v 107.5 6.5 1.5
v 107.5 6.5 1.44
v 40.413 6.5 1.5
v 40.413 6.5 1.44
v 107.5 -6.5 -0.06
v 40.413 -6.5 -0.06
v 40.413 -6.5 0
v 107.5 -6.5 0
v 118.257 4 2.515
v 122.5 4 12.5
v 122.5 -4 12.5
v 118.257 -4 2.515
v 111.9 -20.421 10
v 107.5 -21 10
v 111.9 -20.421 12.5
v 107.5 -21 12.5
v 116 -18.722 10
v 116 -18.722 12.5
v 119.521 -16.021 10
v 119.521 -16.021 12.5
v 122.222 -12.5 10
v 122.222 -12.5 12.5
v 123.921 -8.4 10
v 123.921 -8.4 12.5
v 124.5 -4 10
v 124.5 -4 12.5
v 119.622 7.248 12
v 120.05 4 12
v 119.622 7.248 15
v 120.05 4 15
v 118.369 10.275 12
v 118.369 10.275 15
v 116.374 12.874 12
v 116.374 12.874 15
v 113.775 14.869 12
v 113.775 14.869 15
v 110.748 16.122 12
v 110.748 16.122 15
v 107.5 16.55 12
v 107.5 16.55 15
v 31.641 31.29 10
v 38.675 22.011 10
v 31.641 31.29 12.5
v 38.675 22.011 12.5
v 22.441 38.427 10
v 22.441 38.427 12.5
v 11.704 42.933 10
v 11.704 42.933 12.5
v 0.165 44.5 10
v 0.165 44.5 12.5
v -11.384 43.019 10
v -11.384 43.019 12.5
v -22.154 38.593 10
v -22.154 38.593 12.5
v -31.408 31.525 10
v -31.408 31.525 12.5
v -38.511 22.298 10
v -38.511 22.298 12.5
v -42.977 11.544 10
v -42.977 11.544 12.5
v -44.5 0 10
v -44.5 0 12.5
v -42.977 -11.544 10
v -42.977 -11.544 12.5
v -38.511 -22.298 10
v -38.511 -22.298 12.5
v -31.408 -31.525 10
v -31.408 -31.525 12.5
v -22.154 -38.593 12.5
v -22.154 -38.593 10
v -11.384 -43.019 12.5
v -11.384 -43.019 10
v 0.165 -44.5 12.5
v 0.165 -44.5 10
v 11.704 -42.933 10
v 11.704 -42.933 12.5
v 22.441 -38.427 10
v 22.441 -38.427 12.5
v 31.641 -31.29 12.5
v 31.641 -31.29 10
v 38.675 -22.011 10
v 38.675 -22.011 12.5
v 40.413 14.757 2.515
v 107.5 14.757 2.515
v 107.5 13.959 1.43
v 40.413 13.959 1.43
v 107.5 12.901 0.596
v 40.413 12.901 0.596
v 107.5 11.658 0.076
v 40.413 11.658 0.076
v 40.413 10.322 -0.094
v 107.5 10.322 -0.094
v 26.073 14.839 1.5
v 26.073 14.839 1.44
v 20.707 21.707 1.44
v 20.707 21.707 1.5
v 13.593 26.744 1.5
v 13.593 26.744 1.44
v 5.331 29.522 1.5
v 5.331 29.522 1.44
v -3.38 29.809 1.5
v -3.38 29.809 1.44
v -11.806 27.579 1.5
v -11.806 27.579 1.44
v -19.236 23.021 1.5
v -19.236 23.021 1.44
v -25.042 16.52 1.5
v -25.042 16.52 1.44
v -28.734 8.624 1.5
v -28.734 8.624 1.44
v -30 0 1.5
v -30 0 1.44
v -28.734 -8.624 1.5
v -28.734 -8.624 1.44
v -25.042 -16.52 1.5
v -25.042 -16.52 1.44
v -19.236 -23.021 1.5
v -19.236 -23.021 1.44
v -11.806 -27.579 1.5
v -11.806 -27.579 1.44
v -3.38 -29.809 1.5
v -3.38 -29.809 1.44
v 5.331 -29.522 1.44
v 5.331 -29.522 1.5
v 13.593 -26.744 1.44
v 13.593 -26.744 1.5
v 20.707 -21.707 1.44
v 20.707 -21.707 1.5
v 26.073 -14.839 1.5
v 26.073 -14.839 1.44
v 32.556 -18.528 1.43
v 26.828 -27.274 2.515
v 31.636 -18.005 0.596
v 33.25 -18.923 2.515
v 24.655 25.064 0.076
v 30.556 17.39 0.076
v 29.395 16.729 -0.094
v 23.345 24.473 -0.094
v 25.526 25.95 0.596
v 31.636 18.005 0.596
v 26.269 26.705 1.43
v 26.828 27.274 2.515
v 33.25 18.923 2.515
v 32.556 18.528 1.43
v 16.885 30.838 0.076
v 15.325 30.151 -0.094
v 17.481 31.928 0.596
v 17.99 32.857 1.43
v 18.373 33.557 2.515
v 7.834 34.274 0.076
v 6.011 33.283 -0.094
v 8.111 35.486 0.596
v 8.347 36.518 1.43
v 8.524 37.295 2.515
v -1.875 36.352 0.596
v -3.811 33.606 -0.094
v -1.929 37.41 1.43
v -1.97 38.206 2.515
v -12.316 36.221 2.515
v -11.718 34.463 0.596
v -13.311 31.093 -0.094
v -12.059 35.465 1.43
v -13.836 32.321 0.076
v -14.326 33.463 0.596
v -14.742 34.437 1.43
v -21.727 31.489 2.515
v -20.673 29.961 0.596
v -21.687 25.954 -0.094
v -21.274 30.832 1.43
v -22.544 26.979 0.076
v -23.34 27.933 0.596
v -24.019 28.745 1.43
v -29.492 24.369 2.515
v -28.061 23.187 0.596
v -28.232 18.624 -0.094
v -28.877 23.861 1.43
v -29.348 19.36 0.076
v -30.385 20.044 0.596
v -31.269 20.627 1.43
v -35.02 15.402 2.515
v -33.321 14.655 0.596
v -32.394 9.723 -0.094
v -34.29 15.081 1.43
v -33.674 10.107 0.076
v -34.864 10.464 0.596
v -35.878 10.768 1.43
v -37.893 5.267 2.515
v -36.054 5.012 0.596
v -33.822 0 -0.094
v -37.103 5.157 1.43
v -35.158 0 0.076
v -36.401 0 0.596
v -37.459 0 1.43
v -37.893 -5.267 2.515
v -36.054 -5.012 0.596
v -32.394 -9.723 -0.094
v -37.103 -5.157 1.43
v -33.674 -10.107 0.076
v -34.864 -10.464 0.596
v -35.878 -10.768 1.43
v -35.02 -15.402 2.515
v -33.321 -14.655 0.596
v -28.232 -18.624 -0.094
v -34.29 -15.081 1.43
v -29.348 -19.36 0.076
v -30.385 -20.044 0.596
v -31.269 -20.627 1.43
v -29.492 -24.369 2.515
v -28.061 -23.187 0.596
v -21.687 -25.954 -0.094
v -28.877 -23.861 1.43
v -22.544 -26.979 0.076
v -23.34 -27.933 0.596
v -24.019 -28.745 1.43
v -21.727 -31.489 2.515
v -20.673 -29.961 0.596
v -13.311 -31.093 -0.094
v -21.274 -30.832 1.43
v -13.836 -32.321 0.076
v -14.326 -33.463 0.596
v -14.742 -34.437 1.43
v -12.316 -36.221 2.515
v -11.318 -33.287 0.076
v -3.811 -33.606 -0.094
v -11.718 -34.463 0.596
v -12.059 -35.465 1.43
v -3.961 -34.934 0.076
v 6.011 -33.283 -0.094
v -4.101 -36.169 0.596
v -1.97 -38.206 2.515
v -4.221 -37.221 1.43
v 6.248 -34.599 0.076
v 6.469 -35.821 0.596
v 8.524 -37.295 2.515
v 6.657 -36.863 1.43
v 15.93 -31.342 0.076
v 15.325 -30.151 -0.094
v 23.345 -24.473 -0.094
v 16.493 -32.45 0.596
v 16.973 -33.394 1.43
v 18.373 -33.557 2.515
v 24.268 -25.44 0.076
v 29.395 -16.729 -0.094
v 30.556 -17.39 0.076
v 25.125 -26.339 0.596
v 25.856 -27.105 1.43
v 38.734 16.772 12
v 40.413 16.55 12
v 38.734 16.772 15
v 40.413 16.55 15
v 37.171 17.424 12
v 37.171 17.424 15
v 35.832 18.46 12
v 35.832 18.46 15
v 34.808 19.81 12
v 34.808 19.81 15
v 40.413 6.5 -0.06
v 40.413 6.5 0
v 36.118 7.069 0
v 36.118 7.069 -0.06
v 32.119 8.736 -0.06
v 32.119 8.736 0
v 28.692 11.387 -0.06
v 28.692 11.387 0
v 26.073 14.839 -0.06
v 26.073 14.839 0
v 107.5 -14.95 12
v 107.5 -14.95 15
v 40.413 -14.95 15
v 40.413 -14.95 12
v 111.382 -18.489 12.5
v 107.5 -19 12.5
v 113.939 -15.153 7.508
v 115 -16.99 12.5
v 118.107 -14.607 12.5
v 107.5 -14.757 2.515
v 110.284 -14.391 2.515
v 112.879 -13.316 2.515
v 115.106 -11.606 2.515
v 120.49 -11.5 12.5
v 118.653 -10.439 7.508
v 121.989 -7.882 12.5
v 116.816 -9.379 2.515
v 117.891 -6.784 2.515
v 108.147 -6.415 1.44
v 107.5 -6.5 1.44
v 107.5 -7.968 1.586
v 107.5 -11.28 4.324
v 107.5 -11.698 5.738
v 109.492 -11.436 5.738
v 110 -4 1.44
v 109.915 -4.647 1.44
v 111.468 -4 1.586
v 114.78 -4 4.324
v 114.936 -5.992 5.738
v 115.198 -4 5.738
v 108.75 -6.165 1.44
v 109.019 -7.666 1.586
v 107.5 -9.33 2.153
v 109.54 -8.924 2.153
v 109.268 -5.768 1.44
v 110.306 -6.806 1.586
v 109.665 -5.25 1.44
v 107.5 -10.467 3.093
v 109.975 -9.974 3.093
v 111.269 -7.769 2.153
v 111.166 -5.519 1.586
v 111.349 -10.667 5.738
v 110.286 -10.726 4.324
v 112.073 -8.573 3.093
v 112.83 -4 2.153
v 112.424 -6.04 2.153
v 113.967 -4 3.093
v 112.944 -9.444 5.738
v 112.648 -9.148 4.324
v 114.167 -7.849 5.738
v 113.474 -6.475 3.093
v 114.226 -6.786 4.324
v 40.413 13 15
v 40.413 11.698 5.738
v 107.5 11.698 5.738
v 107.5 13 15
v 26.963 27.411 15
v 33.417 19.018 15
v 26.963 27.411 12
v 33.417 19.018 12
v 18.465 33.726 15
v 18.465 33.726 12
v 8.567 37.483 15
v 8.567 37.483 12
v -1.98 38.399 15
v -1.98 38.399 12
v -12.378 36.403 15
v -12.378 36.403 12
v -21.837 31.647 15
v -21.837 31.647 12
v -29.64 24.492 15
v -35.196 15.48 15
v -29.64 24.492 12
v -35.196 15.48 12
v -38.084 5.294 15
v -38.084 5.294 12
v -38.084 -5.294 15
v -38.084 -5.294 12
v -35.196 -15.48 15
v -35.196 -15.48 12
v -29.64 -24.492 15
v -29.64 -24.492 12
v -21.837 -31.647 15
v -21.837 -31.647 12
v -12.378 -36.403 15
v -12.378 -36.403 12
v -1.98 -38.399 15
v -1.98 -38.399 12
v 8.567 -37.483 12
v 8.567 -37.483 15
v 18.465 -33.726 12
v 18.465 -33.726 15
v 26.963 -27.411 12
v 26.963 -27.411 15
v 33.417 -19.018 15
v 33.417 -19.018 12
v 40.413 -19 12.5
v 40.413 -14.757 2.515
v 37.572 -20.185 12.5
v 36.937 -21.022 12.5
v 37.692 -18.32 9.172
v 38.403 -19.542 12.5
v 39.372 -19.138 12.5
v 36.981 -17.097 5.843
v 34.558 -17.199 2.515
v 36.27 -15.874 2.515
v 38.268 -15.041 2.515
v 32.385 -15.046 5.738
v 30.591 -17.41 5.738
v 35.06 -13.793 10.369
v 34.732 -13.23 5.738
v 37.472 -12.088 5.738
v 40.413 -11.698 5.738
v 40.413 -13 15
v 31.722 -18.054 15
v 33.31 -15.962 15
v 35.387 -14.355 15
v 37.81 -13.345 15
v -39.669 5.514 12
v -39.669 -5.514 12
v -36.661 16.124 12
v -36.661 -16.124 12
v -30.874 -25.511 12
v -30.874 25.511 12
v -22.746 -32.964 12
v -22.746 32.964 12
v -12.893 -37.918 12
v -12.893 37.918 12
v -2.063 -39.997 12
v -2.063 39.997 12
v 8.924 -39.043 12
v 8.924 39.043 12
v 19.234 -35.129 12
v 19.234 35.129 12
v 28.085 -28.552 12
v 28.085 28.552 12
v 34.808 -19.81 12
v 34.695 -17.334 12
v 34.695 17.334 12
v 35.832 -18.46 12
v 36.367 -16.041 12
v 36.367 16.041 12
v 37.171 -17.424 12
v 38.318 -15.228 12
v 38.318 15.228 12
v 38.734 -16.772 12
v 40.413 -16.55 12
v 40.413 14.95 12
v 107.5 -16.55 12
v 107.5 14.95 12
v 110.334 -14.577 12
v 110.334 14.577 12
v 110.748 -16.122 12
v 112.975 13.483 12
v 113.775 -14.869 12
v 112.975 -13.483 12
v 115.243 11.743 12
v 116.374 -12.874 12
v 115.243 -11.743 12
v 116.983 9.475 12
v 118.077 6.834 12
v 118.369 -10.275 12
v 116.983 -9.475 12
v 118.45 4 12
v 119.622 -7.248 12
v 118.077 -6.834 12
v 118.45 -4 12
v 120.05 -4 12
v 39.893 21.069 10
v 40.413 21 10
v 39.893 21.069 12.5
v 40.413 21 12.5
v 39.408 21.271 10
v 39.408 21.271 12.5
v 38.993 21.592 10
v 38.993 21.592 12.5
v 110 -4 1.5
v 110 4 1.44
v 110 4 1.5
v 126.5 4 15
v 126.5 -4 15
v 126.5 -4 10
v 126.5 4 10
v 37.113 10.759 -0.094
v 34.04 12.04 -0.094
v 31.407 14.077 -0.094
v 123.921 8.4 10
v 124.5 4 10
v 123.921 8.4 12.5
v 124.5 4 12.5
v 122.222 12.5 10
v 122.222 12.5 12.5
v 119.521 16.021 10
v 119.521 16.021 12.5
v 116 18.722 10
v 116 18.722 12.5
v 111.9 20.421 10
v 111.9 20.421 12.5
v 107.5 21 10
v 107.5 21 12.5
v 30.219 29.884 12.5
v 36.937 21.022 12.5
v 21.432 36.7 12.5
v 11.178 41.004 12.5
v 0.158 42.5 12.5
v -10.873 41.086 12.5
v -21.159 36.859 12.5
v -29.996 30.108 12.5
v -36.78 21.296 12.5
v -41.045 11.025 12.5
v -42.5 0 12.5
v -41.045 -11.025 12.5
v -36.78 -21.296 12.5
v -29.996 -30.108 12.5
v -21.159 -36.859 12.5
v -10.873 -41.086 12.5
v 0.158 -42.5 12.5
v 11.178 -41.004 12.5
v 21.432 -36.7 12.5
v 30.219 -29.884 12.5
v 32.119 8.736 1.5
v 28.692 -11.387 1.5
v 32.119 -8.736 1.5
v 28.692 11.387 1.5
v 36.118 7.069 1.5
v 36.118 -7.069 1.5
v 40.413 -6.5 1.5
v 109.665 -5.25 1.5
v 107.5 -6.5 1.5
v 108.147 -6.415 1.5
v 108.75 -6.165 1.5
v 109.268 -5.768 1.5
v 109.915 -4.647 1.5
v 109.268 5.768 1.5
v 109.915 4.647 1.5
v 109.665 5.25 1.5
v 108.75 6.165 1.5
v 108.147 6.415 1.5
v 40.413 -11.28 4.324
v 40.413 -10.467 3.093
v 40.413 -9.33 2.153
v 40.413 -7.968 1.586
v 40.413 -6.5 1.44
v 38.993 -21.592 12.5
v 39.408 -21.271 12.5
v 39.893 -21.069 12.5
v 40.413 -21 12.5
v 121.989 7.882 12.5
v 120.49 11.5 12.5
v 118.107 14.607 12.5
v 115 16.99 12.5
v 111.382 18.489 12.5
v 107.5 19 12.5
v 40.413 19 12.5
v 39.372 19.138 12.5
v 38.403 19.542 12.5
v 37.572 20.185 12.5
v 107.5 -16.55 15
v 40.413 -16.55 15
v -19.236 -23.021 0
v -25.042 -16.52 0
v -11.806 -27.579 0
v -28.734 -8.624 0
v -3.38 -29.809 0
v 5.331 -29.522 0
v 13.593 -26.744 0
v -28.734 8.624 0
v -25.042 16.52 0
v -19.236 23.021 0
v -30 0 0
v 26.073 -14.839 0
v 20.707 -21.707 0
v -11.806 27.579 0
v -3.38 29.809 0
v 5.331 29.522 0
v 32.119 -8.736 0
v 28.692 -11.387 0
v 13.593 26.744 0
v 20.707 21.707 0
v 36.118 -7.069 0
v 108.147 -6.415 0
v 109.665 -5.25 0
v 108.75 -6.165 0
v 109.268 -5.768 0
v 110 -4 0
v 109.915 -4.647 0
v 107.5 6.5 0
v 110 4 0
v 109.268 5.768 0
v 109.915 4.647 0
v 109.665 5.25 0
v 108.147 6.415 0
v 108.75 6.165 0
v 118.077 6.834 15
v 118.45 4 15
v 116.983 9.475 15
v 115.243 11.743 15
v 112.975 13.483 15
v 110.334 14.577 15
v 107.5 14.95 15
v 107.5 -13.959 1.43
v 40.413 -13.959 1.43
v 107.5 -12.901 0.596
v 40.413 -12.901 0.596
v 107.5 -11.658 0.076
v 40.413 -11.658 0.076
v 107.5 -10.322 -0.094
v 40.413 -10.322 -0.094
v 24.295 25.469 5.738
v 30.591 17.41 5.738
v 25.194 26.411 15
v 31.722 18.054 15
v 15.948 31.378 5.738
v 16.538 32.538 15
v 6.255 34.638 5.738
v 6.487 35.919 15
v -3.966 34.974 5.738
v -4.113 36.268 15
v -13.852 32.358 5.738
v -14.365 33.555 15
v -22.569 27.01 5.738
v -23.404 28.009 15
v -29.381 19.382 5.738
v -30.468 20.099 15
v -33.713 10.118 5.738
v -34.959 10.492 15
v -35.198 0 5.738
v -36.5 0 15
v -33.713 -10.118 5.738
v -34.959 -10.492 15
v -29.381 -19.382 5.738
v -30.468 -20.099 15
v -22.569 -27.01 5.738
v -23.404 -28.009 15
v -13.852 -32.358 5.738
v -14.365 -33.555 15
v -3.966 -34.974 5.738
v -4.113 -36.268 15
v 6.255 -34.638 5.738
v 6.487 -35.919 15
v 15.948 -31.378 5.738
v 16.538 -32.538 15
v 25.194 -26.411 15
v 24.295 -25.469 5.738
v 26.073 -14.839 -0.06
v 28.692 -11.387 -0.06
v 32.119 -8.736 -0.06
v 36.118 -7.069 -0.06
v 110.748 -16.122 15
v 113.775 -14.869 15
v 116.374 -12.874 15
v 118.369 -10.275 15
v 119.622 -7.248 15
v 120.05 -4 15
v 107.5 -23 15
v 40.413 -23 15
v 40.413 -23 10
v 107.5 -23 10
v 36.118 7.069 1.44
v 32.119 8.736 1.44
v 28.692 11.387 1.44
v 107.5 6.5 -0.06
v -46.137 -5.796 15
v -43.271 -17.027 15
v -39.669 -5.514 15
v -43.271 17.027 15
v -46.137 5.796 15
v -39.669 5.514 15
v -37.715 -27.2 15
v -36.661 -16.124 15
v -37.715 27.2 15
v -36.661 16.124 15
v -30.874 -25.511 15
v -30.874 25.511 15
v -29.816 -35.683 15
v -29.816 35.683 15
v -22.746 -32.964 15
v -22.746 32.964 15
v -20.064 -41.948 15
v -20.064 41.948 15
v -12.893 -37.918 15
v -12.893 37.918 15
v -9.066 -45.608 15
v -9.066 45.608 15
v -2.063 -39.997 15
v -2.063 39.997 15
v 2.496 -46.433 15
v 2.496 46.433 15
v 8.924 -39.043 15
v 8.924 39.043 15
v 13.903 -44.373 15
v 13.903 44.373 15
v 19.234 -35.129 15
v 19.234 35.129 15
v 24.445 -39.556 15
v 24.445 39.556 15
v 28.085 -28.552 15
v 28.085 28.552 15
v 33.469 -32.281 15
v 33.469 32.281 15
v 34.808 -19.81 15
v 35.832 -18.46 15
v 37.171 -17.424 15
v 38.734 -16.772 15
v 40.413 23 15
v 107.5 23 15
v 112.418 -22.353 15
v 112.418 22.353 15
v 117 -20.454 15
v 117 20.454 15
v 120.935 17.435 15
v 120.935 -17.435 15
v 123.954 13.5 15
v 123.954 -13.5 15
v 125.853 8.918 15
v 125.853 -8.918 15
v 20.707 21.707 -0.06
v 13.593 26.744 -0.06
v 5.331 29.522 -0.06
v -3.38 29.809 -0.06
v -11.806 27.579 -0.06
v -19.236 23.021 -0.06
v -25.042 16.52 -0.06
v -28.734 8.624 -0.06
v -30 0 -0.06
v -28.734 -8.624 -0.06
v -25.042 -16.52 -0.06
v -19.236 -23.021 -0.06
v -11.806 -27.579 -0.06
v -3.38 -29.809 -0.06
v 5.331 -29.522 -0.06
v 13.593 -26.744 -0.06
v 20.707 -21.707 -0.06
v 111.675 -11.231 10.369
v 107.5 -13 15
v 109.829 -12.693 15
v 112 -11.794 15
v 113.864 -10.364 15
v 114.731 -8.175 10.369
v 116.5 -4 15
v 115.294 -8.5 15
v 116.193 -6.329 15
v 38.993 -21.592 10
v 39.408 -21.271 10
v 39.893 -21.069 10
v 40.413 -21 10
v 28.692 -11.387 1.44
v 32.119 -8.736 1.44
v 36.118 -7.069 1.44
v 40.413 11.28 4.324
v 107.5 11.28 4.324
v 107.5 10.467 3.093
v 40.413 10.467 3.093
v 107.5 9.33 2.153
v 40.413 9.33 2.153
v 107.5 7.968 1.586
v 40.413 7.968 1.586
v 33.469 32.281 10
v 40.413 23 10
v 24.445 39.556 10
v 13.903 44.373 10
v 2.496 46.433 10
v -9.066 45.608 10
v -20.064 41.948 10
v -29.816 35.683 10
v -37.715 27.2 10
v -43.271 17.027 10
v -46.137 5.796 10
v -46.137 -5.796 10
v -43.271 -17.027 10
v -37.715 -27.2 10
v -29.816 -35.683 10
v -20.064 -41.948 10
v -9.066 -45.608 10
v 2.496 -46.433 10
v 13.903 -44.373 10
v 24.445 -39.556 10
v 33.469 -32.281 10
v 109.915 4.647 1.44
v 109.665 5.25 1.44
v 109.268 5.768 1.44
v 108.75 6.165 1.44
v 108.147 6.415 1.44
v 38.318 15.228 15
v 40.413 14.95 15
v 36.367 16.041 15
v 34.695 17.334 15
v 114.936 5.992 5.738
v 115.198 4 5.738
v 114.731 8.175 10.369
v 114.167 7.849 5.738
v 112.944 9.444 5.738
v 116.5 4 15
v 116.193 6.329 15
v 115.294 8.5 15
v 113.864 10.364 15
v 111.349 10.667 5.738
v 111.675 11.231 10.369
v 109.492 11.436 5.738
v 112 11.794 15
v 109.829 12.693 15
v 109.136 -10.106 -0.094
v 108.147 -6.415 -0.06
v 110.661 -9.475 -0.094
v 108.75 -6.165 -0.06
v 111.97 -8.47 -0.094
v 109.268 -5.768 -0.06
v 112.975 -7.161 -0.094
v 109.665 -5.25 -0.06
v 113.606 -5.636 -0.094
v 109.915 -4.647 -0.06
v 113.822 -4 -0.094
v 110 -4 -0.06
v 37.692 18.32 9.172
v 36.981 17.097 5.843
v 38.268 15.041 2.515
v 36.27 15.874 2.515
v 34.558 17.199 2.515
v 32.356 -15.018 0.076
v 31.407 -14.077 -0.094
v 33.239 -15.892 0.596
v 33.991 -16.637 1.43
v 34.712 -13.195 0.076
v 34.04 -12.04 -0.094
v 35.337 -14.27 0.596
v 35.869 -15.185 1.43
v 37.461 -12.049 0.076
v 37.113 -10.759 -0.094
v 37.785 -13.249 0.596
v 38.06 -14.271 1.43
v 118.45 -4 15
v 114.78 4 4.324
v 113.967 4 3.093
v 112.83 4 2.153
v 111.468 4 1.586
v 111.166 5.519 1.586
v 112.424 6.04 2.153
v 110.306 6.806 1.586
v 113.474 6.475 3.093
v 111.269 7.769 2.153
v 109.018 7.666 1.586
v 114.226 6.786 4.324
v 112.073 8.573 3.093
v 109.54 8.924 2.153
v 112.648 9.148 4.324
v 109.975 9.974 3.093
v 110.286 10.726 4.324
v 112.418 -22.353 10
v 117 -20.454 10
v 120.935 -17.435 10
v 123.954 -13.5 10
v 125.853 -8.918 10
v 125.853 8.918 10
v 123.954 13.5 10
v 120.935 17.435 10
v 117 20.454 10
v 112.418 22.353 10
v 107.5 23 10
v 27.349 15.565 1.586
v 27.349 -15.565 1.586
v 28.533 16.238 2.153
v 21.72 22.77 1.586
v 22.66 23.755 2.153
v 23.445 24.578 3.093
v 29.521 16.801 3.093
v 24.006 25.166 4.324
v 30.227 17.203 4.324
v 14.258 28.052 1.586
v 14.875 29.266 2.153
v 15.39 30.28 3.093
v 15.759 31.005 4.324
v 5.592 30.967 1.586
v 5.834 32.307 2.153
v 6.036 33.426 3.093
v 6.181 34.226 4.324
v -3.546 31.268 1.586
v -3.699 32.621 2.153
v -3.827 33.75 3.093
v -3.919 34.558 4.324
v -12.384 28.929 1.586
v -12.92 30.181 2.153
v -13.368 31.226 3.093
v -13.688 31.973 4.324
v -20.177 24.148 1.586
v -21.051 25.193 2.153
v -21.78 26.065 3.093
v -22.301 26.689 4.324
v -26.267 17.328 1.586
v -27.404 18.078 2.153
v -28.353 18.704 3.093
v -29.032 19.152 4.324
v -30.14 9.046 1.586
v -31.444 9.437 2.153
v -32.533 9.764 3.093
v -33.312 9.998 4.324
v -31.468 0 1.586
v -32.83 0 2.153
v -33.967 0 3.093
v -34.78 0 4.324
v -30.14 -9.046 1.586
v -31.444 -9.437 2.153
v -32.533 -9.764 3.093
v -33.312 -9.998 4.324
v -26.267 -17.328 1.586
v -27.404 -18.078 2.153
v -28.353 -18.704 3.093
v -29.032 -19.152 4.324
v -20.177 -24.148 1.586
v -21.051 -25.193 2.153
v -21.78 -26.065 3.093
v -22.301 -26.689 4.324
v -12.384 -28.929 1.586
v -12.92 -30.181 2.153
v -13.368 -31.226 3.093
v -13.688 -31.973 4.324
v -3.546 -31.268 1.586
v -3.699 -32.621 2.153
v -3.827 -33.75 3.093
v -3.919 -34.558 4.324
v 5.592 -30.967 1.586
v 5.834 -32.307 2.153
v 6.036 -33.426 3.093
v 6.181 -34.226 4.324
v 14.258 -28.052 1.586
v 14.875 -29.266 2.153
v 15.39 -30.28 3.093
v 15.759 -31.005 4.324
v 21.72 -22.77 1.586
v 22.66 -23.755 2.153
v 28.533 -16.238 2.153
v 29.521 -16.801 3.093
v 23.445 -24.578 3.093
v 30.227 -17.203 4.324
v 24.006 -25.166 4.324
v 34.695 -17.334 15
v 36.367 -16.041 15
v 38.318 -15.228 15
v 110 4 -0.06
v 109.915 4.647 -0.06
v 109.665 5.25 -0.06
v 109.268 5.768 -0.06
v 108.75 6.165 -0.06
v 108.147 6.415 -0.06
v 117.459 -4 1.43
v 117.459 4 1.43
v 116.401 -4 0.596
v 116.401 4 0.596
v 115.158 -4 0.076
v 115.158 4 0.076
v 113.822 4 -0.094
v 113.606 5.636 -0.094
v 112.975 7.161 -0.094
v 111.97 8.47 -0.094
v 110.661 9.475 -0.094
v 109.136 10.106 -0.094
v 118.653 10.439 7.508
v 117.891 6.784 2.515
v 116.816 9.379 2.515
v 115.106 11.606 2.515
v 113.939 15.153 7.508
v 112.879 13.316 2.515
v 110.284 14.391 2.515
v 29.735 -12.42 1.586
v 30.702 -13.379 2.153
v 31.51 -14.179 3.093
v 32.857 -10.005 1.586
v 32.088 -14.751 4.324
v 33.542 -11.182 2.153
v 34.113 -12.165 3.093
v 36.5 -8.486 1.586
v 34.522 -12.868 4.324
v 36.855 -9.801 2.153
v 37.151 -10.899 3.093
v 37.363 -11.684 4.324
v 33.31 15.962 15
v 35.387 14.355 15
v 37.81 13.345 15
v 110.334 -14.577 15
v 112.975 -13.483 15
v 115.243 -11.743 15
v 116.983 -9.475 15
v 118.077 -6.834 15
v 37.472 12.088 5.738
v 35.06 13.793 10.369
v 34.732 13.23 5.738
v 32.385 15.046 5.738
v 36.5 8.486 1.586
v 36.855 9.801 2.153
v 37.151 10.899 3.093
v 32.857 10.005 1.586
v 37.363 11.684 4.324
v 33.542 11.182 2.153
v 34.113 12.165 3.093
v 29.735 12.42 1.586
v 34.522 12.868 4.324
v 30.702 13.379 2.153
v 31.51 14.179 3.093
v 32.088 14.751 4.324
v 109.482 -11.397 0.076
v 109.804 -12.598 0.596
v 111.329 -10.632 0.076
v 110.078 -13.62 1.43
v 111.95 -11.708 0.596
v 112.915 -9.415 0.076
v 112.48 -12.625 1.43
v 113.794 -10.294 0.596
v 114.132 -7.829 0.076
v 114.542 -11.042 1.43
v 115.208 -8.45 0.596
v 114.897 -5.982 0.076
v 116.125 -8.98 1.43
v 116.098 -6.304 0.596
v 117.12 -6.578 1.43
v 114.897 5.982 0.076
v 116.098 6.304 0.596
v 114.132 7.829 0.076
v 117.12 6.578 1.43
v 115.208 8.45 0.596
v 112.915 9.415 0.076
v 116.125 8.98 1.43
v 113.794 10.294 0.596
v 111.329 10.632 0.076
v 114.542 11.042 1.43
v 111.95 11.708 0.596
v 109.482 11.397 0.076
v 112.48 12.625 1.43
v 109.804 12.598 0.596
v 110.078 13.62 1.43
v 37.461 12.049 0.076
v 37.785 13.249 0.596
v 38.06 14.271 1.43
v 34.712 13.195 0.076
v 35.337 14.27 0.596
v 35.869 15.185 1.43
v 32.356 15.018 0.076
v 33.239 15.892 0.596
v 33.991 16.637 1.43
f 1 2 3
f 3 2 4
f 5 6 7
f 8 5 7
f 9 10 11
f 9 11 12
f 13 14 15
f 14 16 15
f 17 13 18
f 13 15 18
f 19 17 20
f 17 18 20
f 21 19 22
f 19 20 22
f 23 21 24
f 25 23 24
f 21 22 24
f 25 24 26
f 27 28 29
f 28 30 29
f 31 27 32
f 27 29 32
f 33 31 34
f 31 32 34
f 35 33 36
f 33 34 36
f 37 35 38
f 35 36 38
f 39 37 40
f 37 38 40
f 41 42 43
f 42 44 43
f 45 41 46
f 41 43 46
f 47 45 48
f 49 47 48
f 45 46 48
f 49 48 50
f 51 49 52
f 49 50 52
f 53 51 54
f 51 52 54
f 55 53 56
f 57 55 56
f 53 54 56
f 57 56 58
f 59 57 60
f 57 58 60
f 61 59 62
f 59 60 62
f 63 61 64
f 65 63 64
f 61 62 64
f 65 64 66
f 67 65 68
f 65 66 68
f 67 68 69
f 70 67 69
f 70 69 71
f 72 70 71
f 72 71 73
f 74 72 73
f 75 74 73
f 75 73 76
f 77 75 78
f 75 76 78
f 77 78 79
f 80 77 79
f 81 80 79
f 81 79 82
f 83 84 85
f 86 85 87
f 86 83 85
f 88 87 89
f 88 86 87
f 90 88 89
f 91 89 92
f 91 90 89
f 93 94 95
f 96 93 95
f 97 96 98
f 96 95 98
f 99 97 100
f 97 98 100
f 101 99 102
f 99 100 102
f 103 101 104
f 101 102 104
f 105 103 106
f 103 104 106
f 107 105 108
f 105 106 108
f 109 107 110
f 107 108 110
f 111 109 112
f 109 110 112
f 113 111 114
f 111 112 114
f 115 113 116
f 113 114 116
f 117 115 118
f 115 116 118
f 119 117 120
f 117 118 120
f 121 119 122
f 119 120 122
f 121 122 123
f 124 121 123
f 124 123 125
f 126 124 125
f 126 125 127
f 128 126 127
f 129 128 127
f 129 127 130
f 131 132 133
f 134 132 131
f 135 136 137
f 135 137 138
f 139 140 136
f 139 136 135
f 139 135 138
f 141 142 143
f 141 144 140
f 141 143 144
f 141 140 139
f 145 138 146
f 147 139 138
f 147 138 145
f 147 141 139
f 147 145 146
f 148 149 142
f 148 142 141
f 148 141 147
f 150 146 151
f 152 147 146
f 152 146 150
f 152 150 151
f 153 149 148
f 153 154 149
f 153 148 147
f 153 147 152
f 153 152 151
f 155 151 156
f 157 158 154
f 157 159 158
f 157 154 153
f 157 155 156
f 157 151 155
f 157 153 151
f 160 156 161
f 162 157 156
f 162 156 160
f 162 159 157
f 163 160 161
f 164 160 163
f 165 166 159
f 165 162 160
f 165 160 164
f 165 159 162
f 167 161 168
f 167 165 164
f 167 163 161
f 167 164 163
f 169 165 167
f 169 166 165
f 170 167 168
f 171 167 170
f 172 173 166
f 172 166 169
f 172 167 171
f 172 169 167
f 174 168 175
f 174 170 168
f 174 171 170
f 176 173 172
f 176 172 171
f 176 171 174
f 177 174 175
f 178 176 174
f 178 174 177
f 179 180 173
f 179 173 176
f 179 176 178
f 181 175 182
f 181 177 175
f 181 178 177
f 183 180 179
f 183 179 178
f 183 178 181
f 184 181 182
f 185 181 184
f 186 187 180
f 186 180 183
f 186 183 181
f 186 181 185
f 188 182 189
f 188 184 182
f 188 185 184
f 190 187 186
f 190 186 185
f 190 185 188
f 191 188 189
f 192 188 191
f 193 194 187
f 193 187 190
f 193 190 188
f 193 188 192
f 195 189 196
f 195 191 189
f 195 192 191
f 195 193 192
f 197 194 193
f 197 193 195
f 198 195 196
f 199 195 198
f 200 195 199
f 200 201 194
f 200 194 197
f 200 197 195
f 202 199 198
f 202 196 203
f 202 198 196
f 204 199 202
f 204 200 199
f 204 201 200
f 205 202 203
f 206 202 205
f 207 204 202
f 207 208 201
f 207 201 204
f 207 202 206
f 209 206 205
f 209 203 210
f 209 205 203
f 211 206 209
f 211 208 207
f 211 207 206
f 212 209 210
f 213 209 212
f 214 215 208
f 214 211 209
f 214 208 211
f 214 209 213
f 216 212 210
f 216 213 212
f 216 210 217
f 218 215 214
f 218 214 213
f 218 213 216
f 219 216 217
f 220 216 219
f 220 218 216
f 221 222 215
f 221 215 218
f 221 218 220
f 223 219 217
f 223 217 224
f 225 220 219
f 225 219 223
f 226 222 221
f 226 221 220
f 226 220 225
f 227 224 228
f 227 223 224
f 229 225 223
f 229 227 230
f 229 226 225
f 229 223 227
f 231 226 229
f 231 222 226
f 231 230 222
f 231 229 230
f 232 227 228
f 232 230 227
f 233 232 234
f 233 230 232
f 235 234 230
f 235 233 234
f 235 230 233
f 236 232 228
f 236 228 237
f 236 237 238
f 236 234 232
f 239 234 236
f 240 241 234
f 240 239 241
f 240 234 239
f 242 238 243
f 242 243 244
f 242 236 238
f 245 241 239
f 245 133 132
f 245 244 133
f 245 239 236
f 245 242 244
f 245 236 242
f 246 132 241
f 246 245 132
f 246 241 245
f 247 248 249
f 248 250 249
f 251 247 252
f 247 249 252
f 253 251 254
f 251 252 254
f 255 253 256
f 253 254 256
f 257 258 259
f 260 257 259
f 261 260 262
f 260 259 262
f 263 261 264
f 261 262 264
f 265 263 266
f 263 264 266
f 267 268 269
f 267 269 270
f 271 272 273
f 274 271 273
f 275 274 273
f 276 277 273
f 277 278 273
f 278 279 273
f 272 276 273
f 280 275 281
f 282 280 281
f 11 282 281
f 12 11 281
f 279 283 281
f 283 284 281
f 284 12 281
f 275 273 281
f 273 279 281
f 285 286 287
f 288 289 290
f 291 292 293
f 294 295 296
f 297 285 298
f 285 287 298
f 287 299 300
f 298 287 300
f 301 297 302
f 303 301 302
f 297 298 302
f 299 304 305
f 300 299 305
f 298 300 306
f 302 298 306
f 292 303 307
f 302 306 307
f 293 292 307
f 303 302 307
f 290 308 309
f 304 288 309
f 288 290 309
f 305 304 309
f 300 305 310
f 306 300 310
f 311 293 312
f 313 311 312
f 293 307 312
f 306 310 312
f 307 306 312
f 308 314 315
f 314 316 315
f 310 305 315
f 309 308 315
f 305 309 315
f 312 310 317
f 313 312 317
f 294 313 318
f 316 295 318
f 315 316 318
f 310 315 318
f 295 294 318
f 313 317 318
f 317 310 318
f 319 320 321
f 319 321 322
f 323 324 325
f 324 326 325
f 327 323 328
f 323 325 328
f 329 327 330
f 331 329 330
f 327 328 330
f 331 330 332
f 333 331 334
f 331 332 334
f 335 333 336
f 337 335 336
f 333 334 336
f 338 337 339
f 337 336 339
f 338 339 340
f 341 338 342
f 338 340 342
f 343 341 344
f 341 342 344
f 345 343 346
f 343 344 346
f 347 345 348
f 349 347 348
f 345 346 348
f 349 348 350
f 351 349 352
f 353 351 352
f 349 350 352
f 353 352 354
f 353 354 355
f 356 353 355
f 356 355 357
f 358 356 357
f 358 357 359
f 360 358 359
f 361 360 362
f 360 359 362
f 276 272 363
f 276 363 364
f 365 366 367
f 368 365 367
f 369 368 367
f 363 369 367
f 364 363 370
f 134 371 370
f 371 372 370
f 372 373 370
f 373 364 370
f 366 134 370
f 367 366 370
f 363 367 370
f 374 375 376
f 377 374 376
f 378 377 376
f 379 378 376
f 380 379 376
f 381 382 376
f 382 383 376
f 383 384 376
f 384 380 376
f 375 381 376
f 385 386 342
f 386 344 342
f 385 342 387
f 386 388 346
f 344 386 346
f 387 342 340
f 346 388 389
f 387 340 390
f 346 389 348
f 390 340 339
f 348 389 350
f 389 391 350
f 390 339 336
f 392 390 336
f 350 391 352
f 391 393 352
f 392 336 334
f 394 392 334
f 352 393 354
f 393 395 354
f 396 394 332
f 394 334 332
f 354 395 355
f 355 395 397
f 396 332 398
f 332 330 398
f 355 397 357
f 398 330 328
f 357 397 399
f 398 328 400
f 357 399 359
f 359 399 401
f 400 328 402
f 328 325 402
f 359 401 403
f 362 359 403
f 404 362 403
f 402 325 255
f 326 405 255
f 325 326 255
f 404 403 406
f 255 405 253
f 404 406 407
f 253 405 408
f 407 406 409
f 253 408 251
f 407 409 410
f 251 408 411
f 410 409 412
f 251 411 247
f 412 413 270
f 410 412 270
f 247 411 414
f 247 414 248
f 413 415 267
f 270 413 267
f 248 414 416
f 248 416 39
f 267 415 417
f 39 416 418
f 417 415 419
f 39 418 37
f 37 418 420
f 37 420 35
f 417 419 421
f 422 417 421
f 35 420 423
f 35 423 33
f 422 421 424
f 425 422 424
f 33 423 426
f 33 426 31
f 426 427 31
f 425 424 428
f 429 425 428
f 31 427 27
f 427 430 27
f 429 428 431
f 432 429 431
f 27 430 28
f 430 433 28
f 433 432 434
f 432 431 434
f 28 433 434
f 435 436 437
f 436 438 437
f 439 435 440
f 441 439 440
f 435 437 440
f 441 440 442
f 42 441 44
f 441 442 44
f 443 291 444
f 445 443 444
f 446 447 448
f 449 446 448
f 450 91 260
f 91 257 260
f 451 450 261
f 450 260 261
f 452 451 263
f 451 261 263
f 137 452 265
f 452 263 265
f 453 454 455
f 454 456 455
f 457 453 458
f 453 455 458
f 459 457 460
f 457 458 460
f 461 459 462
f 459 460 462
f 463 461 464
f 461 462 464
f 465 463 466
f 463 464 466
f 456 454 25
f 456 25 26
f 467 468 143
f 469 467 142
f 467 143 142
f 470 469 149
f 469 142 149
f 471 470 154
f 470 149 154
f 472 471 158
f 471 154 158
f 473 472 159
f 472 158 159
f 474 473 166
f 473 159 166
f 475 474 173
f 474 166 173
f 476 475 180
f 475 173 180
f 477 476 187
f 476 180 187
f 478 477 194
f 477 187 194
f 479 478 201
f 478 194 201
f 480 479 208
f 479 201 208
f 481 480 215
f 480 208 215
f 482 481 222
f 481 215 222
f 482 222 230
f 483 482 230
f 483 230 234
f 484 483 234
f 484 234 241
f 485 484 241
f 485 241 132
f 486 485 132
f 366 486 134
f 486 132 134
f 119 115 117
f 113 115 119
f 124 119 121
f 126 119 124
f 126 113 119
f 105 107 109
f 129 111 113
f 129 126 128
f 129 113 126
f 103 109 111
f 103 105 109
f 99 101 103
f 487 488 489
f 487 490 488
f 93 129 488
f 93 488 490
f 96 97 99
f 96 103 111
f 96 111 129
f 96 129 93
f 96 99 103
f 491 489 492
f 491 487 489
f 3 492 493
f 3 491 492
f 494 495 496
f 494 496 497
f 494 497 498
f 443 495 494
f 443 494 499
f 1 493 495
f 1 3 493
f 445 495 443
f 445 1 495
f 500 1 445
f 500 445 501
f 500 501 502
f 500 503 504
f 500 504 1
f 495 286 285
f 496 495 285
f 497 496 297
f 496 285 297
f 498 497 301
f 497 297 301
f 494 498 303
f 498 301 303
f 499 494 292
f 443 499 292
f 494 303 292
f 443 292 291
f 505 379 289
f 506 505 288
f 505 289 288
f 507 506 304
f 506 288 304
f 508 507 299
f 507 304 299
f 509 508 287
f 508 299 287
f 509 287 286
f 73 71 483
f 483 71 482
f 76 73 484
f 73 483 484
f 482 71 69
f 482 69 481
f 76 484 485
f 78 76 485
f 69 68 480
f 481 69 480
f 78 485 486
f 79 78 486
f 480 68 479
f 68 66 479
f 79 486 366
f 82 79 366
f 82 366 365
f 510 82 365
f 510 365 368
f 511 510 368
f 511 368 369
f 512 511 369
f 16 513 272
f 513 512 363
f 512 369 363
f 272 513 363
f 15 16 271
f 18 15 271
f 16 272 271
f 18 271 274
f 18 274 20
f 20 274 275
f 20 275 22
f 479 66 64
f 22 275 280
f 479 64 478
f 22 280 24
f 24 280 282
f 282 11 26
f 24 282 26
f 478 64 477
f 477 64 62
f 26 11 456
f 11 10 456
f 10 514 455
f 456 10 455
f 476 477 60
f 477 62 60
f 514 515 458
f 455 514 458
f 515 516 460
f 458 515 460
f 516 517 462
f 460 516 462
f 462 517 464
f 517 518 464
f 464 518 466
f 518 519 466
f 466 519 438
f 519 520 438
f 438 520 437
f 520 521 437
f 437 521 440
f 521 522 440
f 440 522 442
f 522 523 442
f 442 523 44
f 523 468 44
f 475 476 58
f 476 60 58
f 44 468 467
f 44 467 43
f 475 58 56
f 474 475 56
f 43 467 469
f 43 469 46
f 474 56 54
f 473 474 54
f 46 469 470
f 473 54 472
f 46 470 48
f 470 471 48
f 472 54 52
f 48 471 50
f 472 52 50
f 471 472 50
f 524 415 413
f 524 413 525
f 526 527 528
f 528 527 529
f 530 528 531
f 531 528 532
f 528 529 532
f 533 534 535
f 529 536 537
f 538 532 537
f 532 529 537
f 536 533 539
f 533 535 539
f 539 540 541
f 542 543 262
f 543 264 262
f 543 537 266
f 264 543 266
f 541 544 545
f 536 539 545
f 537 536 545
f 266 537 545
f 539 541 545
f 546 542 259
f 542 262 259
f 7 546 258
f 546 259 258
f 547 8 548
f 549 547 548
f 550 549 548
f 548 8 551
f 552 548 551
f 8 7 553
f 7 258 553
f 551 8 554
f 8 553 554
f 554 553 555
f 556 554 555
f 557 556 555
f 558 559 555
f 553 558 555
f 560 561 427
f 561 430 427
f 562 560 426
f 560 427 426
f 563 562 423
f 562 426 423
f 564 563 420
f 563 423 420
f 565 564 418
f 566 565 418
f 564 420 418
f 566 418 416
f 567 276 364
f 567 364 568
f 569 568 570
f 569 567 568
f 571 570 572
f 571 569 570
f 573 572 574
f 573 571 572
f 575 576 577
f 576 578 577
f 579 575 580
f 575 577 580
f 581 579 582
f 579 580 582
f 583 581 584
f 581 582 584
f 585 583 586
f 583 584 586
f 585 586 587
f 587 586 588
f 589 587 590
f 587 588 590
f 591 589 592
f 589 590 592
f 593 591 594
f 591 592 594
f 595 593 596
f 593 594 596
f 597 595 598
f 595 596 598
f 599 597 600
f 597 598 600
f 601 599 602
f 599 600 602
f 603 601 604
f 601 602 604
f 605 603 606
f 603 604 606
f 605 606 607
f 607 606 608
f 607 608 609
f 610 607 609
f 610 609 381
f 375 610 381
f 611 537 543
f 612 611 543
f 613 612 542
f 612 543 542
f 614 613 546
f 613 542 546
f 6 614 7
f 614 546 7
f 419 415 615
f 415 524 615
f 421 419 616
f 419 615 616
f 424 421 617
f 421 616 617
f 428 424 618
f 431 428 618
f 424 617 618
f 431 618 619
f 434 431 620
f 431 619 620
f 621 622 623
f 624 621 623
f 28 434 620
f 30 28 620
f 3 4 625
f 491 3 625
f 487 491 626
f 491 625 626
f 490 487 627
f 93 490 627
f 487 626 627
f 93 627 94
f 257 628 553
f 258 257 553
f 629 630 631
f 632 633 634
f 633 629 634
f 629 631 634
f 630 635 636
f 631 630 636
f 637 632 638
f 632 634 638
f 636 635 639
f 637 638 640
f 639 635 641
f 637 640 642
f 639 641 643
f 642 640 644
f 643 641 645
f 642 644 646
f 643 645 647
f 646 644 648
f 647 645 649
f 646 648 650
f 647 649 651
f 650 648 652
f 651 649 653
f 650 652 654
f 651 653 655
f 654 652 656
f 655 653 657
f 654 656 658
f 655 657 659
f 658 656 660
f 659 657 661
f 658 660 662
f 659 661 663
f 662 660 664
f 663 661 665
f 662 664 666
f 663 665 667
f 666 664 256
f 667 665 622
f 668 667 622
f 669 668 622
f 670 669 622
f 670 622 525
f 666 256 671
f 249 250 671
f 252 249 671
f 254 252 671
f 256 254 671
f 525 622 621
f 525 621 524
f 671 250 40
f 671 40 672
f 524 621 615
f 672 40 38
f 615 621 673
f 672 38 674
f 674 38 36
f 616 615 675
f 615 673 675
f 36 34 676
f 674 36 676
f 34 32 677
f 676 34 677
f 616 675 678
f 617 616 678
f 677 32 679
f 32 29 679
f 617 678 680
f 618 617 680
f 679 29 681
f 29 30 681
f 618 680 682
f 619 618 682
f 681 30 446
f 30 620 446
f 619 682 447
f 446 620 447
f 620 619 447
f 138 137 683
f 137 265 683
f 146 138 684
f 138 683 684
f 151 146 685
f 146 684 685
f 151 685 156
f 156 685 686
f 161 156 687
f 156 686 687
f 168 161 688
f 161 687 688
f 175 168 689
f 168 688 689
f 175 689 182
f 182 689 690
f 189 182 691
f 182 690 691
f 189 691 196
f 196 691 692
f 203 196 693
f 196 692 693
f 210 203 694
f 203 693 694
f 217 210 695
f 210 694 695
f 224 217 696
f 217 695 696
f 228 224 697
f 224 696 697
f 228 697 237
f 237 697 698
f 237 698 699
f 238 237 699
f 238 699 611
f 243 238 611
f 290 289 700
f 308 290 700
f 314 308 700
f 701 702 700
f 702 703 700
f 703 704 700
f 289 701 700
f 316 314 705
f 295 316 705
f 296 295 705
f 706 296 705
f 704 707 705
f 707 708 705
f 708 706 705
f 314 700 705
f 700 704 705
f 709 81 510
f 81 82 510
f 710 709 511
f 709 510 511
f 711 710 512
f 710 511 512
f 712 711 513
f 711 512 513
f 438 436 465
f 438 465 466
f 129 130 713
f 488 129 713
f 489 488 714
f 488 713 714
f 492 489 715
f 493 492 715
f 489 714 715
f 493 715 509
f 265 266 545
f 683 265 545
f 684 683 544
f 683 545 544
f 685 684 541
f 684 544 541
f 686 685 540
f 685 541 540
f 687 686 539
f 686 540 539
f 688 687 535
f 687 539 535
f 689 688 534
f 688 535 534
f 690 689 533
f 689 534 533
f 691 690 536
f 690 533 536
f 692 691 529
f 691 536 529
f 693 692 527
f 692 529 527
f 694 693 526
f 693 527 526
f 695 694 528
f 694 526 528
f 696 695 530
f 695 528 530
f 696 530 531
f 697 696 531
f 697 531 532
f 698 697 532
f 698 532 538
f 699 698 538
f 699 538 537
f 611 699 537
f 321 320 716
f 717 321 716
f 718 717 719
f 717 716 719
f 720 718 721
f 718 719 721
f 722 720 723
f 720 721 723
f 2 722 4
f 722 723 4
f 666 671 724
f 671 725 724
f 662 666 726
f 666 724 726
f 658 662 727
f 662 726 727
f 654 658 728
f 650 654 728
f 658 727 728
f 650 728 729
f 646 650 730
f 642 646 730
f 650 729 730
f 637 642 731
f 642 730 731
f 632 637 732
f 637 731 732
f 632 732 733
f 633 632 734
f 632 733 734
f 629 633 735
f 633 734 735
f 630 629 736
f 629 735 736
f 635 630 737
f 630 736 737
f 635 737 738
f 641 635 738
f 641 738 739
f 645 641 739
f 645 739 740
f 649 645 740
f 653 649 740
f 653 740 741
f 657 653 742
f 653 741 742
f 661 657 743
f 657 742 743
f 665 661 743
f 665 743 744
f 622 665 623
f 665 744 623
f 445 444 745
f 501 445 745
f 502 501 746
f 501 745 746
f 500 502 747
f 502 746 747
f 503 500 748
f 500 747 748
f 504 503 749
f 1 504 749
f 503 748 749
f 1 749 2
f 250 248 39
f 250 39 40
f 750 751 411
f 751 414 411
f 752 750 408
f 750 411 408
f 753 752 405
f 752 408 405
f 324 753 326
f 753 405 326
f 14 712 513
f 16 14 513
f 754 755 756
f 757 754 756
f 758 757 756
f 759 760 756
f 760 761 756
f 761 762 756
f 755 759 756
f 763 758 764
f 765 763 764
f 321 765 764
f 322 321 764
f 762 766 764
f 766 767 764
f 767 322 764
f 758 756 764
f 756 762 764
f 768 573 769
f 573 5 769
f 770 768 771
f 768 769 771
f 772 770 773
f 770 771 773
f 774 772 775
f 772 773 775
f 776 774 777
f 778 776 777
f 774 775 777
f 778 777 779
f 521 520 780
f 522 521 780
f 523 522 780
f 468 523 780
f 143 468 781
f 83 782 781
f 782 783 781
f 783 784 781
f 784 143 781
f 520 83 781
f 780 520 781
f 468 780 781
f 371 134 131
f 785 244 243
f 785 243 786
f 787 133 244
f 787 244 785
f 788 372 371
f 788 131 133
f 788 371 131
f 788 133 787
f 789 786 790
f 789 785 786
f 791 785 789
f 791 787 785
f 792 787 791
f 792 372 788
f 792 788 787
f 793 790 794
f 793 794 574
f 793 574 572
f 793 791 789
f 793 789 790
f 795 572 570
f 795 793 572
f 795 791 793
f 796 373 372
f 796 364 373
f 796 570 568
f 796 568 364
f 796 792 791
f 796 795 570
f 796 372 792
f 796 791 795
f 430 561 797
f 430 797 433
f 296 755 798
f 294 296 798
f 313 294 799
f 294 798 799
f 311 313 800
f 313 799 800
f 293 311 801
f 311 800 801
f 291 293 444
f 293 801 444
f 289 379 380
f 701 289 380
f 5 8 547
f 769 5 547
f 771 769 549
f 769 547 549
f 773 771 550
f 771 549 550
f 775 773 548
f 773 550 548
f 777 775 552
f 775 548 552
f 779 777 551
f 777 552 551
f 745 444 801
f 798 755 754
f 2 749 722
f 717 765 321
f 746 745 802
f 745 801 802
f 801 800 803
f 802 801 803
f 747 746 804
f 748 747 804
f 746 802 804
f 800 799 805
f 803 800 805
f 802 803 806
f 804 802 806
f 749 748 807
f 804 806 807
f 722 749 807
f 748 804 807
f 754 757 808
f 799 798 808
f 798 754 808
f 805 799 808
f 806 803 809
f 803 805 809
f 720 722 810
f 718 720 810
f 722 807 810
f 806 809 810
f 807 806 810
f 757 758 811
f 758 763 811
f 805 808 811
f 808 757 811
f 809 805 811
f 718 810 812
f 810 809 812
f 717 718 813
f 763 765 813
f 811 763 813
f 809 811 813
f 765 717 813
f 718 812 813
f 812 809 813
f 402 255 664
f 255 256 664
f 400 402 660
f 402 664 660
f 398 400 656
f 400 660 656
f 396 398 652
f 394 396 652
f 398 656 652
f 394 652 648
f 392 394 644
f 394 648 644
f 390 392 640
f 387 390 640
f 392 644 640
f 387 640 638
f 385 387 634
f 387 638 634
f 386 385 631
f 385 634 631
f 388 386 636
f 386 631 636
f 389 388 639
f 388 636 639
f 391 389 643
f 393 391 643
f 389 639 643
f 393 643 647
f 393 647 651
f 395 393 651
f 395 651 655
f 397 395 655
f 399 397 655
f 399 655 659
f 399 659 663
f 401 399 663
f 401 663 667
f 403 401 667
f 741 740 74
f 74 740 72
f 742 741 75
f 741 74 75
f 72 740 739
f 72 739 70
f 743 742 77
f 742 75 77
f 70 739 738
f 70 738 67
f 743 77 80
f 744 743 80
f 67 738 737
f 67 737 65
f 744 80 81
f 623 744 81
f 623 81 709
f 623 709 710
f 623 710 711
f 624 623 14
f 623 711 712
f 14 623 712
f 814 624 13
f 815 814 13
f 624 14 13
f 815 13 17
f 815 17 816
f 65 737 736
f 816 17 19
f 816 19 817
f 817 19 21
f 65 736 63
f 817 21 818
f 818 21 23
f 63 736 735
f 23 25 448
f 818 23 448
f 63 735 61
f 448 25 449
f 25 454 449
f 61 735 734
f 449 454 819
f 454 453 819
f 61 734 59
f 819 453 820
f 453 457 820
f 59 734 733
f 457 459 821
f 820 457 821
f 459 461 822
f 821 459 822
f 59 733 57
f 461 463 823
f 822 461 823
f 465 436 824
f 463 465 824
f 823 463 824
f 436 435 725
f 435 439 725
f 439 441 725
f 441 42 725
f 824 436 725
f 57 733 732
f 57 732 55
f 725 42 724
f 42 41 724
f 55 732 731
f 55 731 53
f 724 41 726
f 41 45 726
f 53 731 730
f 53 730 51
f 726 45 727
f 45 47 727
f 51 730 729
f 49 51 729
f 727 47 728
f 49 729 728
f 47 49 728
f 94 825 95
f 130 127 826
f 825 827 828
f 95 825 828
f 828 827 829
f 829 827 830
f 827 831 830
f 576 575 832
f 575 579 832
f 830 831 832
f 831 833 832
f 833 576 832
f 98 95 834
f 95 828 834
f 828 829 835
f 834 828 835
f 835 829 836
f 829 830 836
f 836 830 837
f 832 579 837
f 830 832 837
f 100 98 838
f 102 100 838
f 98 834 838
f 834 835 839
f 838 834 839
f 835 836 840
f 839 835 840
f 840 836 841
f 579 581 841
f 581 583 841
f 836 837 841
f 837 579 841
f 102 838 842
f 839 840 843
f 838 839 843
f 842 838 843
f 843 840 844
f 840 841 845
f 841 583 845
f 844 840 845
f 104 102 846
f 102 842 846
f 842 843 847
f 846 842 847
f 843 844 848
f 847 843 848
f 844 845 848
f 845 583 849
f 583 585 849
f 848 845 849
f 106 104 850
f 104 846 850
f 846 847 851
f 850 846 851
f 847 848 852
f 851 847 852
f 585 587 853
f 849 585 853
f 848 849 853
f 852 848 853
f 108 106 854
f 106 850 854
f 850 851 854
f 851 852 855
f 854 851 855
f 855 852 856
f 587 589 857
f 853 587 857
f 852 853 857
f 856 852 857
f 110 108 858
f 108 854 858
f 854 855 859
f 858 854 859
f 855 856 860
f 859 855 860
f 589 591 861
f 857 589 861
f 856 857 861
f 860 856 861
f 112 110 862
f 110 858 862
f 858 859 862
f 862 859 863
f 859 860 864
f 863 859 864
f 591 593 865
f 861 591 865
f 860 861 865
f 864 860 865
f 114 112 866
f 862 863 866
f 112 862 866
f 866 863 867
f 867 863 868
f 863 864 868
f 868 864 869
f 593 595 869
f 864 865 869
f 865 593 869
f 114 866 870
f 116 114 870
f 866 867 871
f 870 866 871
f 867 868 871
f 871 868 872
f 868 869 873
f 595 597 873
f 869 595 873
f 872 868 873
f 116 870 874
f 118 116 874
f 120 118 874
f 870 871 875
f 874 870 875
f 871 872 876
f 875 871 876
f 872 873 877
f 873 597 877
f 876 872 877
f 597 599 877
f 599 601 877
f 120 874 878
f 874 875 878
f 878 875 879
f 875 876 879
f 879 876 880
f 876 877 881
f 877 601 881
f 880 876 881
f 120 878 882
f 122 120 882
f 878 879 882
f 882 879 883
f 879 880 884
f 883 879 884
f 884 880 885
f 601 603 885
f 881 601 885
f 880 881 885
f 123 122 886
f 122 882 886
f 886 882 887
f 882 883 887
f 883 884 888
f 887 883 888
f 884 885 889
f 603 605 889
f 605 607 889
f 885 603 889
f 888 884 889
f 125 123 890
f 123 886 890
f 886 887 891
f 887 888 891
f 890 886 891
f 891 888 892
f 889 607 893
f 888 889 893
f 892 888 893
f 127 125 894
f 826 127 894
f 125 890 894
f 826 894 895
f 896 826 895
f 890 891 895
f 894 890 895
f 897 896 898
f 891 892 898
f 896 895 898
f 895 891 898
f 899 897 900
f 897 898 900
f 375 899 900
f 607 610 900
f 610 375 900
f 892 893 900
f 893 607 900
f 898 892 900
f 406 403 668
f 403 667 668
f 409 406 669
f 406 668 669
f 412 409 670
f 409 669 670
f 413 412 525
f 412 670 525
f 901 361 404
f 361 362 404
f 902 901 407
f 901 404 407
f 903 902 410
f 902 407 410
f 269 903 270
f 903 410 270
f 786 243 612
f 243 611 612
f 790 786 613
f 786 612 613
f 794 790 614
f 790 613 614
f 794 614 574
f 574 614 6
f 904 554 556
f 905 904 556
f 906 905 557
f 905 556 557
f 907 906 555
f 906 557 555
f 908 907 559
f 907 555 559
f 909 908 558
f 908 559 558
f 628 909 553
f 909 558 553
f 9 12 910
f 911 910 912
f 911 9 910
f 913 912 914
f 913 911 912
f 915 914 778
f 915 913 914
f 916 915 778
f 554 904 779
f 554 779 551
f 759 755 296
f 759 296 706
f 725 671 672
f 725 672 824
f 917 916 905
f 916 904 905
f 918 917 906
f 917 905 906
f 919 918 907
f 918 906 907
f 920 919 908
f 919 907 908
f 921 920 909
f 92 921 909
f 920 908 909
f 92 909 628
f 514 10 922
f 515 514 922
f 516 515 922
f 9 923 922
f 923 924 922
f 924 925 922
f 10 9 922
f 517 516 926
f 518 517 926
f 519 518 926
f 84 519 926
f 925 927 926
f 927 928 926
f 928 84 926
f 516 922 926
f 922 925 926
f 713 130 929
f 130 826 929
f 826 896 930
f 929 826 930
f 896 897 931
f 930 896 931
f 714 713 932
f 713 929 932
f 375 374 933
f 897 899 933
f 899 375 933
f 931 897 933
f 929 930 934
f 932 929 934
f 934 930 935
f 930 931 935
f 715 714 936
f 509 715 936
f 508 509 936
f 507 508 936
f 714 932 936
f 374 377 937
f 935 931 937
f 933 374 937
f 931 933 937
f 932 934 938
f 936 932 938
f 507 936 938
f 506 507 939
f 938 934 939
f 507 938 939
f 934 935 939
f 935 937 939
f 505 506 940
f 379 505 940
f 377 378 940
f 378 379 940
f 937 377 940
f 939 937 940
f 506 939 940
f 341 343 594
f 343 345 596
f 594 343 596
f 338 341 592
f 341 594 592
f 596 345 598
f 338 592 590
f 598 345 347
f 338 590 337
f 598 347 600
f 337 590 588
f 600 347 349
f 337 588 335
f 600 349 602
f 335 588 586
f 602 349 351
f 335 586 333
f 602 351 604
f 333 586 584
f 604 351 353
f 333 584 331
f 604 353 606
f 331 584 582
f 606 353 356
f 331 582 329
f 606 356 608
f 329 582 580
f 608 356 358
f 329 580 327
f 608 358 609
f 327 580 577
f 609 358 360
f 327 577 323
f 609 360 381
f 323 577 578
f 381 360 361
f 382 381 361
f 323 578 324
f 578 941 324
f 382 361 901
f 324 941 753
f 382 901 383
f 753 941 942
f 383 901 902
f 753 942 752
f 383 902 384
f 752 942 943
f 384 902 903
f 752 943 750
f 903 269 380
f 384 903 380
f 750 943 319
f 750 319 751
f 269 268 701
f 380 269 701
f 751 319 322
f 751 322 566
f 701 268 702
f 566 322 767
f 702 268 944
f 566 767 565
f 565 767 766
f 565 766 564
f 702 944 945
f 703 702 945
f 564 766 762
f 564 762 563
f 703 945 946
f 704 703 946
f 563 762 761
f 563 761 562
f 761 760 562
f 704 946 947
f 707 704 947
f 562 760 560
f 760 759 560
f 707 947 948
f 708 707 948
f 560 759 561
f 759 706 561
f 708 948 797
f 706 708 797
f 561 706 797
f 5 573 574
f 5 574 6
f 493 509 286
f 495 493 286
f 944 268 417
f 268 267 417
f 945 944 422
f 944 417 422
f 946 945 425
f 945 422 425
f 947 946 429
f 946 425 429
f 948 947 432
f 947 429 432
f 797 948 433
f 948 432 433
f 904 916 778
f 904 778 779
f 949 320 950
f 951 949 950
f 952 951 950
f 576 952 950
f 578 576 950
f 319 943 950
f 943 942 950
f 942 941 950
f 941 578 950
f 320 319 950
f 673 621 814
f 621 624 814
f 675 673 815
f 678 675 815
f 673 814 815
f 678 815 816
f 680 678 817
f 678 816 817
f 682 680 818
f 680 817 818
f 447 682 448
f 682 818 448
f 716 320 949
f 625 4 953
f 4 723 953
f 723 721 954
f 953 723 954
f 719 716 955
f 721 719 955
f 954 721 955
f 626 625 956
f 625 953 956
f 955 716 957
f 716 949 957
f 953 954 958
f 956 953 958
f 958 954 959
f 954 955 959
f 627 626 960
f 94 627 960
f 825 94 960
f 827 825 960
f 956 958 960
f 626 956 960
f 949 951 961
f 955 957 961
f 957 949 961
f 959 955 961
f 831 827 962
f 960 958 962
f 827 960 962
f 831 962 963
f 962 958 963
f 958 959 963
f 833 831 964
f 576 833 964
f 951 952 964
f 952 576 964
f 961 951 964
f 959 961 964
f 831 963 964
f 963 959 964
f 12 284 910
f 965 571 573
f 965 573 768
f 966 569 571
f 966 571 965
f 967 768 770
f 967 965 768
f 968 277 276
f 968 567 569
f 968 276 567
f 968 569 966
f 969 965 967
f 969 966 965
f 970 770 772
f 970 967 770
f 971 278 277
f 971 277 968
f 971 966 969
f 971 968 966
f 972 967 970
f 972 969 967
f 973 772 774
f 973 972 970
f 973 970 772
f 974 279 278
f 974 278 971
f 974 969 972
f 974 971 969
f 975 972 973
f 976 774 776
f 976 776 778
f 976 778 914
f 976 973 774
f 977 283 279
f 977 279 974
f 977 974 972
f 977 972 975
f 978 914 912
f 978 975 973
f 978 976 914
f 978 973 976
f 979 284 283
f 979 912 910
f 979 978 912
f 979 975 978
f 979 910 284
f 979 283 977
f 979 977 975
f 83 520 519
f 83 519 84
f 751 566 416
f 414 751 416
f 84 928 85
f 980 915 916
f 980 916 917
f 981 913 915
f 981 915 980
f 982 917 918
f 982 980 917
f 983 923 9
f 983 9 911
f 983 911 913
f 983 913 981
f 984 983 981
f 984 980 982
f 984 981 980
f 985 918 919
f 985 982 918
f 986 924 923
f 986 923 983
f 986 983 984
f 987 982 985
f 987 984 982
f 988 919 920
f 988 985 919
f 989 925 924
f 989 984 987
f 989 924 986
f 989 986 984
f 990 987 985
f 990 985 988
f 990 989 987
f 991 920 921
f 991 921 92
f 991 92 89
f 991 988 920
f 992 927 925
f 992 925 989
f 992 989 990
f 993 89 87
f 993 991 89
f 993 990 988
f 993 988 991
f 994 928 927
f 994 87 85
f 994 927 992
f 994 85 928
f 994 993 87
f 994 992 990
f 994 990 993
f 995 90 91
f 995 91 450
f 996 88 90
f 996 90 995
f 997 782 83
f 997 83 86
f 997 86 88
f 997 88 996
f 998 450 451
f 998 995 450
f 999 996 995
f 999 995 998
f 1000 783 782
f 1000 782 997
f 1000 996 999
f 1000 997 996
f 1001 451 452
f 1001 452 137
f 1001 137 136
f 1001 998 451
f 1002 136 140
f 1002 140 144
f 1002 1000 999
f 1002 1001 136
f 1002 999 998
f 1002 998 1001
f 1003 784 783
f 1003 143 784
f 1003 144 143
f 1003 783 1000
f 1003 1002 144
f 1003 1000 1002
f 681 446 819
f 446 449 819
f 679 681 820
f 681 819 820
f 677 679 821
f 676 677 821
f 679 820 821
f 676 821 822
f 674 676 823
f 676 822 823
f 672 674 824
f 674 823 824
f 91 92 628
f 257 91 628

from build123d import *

# Parameters (mm, degrees)
F3_DEPTH = 1.5


with BuildPart() as f2:
    # F2: sweep along a path in F1
    with BuildLine(Plane.XY) as f2_path:
        ThreePointArc((107.5000001721, -6.5), (109.267767163, -5.7677669149), (110.0000001721, -3.9999998925))
        Line((110.0000001721, -3.9999998925), (109.9999998279, 4.0000001075))
        ThreePointArc((109.9999998279, 4.0000001075), (109.2677667429, 5.767766991), (107.4999998279, 6.5))
        Line((107.4999998279, 6.5), (40.4134878475, 6.5))
        ThreePointArc((40.4134878475, 6.5), (32.1192516055, 8.7362121033), (26.0732179661, 14.8387096774))
        ThreePointArc((26.0732179661, 14.8387096774), (-30, 0), (26.0732179661, -14.8387096774))
        ThreePointArc((26.0732179661, -14.8387096774), (32.1192516055, -8.7362121033), (40.4134878475, -6.5))
        Line((40.4134878475, -6.5), (107.5000001721, -6.5))
    # F0 (on Front) → F2 (sweep)
    with BuildSketch(Plane.XZ):
        with BuildLine():
            Line((-33.8218298437, -0.093526227), (-30, -0.0597173114))
            Line((-30, -0.0597173114), (-30, 1.4402826886))
            ThreePointArc((-30, 1.4402826886), (-33.4331031287, 2.5807074242), (-35.1984127671, 5.7383089745))
            Line((-35.1984127671, 5.7383089745), (-36.5, 14.9995833623))
            Line((-36.5, 14.9995833623), (-38.45, 14.9995833623))
            Line((-38.45, 14.9995833623), (-38.45, 11.9995833623))
            Line((-38.45, 11.9995833623), (-40.05, 11.9995833623))
            Line((-40.05, 11.9995833623), (-40.05, 15))
            Line((-40.05, 15), (-46.5, 15))
            Line((-46.5, 15), (-46.5, 10))
            Line((-46.5, 10), (-44.5, 10))
            Line((-44.5, 10), (-44.5, 12.5))
            Line((-44.5, 12.5), (-42.5, 12.5))
            Line((-42.5, 12.5), (-38.2571726182, 2.515018017))
            ThreePointArc((-38.2571726182, 2.515018017), (-36.400812876, 0.5964028574), (-33.8218298437, -0.093526227))
        make_face()
    sweep(path=f2_path.line)

    # F1 (on Top) → F3 (join)
    with BuildSketch(Plane.XY):
        with BuildLine():
            Line((40.4134878475, -6.5), (107.5000001721, -6.5))
            ThreePointArc((107.5000001721, -6.5), (109.267767163, -5.7677669149), (110.0000001721, -3.9999998925))
            Line((110.0000001721, -3.9999998925), (109.9999998279, 4.0000001075))
            ThreePointArc((109.9999998279, 4.0000001075), (109.2677667429, 5.767766991), (107.4999998279, 6.5))
            Line((107.4999998279, 6.5), (40.4134878475, 6.5))
            ThreePointArc((40.4134878475, 6.5), (32.1192516055, 8.7362121033), (26.0732179661, 14.8387096774))
            ThreePointArc((26.0732179661, 14.8387096774), (-30, 0), (26.0732179661, -14.8387096774))
            ThreePointArc((26.0732179661, -14.8387096774), (32.1192516055, -8.7362121033), (40.4134878475, -6.5))
        make_face()
    extrude(amount=F3_DEPTH)


solid = f2.part
